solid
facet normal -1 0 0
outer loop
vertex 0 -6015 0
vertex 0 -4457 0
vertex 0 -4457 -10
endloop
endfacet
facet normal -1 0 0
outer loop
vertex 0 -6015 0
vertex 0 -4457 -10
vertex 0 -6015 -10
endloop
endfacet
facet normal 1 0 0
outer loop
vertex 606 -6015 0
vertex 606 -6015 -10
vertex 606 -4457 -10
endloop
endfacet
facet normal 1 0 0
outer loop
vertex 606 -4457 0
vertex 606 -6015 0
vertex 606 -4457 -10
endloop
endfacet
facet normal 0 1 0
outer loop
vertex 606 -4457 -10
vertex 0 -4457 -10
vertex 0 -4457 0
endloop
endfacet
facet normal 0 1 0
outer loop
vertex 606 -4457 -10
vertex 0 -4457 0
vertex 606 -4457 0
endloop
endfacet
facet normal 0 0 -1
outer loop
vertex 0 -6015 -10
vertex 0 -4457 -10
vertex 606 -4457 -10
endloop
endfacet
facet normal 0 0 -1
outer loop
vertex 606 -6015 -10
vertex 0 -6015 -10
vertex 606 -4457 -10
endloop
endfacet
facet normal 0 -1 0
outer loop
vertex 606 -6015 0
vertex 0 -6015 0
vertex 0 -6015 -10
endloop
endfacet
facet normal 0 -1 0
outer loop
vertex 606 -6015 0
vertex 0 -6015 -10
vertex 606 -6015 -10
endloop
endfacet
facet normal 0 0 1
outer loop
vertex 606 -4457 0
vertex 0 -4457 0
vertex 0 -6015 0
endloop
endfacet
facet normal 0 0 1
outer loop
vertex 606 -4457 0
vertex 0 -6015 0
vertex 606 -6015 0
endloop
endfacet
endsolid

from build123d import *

# Parameters (mm, degrees)
TABAN_FLAN_1_DEPTH         = 10
KES_EKSTR_ZYON1_DEPTH      = 6203.134229441
KES_EKSTR_ZYON1_DEPTH_BACK = 6203.134229441
IZIM2_W                    = 906
IZIM2_H                    = 514.622046042
KES_EKSTR_ZYON2_DEPTH      = 6203.134229441
KES_EKSTR_ZYON2_DEPTH_BACK = 6203.134229441
IZIM3_W                    = 1175.952493344
IZIM3_H                    = 433.266784627


# Sheet-metal steps are written as plain solids
with BuildPart() as part:
    # Çizim1 → Taban-Flanş1 (new body)
    with BuildSketch(Plane.XY):
        Polygon((0, 0), (0, -6015), (606, -6015), (606, -4460), (1512, -4460), (1512, 0), align=None)
    extrude(amount=-TABAN_FLAN_1_DEPTH)

    # Çizim2 → Kes-Ekstrüzyon1 (cut, two sides: drawn at the far end of the back side and taken through both)
    with BuildSketch(Plane.XY.offset(-KES_EKSTR_ZYON1_DEPTH_BACK)):
        Polygon((1512, -4457), (1512, 0), (0, 0), (0, -4457), (606, -4457), align=None)
        with Locations((1059, -4717.311023021)):
            Rectangle(IZIM2_W, IZIM2_H)
    extrude(amount=KES_EKSTR_ZYON1_DEPTH + KES_EKSTR_ZYON1_DEPTH_BACK, mode=Mode.SUBTRACT)

    # Çizim3 → Kes-Ekstrüzyon2 (cut, two sides: drawn at the far end of the back side and taken through both)
    with BuildSketch(Plane.XY.offset(-KES_EKSTR_ZYON2_DEPTH_BACK)):
        with Locations((1193.976246672, -4355.859551482)):
            Rectangle(IZIM3_W, IZIM3_H)
    extrude(amount=KES_EKSTR_ZYON2_DEPTH + KES_EKSTR_ZYON2_DEPTH_BACK, mode=Mode.SUBTRACT)


solid = part.part
